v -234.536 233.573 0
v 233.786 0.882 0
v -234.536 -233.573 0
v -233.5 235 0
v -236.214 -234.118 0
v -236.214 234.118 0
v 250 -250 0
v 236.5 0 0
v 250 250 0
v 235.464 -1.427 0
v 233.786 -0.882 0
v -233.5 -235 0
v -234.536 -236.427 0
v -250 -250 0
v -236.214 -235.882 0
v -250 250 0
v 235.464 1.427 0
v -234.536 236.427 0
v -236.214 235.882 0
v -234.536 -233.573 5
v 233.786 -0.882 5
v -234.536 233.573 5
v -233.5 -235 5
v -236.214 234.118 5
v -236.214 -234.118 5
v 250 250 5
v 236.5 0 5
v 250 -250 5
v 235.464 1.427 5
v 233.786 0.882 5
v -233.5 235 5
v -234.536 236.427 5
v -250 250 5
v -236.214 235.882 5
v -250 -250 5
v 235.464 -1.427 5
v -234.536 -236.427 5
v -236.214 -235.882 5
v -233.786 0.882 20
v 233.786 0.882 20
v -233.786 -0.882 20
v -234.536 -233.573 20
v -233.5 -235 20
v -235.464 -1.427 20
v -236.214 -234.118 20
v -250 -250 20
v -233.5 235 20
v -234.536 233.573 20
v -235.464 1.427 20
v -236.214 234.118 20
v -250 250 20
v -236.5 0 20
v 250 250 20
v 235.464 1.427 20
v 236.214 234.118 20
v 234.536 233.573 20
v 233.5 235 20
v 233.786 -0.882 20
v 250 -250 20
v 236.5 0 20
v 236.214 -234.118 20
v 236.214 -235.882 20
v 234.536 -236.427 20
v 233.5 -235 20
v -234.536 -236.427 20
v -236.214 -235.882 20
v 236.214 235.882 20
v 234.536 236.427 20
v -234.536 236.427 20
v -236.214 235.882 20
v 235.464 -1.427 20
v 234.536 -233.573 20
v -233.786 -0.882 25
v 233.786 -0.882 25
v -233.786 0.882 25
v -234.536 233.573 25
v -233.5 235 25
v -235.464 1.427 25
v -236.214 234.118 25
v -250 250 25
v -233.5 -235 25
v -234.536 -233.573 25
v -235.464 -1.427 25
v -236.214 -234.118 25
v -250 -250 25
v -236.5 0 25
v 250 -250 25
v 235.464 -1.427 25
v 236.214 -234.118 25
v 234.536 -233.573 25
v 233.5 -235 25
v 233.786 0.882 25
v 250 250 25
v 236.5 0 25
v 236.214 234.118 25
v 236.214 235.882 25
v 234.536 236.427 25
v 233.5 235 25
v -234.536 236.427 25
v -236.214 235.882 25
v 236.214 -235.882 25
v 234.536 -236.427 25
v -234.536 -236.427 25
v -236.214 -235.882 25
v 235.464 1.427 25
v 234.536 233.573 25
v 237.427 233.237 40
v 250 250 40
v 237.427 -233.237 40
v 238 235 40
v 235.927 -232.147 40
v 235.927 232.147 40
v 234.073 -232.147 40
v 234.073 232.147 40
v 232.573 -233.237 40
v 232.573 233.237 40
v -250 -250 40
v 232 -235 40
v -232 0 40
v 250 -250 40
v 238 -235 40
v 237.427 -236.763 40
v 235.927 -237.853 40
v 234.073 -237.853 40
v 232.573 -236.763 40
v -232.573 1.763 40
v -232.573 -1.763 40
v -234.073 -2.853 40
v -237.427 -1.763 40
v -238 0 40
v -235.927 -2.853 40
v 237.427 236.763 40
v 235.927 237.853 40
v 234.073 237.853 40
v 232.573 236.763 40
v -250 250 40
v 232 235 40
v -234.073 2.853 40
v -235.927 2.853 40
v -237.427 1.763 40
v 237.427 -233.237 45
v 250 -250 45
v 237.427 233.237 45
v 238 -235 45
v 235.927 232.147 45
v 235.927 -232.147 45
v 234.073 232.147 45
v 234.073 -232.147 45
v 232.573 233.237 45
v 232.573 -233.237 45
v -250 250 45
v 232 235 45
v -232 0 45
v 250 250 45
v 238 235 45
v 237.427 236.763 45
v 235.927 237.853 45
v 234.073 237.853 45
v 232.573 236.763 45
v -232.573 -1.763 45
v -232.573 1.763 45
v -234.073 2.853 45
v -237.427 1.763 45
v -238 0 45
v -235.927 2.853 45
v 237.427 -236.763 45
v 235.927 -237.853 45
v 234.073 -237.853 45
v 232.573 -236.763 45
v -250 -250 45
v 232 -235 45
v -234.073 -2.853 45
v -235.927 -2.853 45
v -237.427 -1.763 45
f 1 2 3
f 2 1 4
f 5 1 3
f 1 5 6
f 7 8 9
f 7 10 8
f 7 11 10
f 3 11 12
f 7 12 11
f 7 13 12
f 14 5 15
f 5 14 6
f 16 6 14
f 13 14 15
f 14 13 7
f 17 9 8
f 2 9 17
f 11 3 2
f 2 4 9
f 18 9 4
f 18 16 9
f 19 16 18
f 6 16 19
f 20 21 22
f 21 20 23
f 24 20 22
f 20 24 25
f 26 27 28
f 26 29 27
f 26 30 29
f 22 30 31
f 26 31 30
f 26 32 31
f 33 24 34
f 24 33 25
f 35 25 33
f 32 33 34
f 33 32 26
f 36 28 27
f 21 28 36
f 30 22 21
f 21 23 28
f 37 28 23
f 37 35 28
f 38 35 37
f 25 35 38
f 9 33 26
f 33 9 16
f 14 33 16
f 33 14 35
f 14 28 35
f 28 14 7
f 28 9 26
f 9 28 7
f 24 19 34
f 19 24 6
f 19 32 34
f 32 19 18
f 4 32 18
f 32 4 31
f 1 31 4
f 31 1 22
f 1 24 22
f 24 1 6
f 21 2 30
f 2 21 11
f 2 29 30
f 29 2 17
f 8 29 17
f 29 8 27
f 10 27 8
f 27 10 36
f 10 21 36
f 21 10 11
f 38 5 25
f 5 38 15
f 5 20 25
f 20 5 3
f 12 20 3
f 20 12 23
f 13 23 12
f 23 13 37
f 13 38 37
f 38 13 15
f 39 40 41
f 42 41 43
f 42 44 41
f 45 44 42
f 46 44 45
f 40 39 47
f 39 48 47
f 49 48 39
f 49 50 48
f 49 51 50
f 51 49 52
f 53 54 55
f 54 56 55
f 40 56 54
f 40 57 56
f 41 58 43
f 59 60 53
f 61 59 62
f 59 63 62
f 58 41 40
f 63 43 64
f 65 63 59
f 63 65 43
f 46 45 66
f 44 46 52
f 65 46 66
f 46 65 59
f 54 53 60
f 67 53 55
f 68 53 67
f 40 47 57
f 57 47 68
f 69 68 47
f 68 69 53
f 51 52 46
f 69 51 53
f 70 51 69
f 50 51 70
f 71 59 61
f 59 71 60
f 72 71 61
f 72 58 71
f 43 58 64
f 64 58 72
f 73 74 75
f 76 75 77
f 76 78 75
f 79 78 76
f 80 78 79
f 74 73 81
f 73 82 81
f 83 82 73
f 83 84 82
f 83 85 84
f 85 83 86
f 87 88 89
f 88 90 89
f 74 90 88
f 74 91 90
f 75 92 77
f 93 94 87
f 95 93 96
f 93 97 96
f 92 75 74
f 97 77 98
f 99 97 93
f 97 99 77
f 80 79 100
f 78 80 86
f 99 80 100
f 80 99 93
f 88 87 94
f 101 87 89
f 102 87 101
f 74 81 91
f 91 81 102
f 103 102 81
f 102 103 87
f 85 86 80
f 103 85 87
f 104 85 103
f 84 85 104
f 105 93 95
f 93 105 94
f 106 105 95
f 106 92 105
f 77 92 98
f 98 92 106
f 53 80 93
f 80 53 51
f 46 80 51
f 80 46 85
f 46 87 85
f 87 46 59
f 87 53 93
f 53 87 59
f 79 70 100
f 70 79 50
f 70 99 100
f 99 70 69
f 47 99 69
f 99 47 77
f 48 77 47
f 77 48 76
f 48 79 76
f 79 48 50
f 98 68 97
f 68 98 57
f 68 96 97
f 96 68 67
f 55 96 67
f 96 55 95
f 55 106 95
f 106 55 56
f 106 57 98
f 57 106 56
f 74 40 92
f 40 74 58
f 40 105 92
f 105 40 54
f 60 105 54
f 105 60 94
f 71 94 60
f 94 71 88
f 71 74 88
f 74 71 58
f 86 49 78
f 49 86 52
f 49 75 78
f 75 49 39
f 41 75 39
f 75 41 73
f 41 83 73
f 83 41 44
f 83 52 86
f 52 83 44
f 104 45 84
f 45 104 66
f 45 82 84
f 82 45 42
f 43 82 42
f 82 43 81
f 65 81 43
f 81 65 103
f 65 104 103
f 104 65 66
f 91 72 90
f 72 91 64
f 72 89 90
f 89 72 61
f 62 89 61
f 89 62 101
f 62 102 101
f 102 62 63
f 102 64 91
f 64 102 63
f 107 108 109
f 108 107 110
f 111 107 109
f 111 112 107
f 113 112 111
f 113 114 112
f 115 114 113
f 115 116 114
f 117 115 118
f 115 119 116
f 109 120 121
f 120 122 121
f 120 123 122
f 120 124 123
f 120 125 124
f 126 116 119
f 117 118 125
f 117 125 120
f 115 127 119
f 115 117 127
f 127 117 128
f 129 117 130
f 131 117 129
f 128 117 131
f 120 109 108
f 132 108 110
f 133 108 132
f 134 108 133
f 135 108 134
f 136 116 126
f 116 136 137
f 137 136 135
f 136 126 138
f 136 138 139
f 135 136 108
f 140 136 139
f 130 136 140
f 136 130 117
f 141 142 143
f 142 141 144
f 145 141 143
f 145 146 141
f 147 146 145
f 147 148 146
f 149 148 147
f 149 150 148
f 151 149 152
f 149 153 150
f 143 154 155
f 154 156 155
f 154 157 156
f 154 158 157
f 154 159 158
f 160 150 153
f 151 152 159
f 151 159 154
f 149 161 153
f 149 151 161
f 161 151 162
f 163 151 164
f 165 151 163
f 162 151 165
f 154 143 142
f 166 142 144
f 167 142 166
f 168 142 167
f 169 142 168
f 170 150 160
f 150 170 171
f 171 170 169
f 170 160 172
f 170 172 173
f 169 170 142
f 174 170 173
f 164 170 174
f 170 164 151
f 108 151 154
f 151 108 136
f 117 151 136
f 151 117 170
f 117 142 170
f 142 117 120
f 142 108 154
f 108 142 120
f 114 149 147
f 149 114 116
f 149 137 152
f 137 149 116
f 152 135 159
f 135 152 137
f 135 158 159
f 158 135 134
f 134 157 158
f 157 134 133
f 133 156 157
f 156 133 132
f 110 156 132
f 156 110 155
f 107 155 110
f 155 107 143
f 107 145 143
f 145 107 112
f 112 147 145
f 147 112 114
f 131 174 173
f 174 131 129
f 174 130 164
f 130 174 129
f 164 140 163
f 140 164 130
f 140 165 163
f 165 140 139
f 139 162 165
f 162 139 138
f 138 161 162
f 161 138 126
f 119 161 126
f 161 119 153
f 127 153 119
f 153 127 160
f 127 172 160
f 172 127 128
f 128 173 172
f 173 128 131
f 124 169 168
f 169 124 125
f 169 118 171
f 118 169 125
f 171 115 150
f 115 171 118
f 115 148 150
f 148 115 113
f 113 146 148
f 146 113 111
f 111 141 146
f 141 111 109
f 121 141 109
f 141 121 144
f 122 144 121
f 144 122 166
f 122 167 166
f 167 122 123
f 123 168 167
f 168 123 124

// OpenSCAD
//Variables
size = 500;		//Table Size
levelHoleRadius = 1.5; //3mm / M3
coverHoleRadius = 1.5; //3mm / M3
coverHoleExtensionFactor = 2;
screwOffset = 15;
screwDistance = size /2 - screwOffset;

//Modules
module top() {
	difference() {
		table();
		level_holes(radius=levelHoleRadius);
		cover_holes(radius=levelHoleRadius);
	}
}

module base() {
	difference() {
		table();
		level_holes(radius=levelHoleRadius);
	}
}

module cover() {
	difference() {
		table();
		cover_holes(radius=coverHoleRadius*coverHoleExtensionFactor);
	}
}

//Render
linear_extrude(height=5)base();
translate([0,0,20])linear_extrude(height=5)top();
translate([0,0,40])linear_extrude(height=5)cover();

//Helper Modules
module level_holes(radius) {
	translate([screwDistance,0])circle(r=radius);
	translate([-screwDistance,-screwDistance])circle(r=radius);
	translate([-screwDistance,screwDistance])circle(r=radius);
}

module cover_holes(radius) {
	rotate(a=[0,0,180])level_holes(radius=radius);
}

module table() {
		square(size,center=true);
}
